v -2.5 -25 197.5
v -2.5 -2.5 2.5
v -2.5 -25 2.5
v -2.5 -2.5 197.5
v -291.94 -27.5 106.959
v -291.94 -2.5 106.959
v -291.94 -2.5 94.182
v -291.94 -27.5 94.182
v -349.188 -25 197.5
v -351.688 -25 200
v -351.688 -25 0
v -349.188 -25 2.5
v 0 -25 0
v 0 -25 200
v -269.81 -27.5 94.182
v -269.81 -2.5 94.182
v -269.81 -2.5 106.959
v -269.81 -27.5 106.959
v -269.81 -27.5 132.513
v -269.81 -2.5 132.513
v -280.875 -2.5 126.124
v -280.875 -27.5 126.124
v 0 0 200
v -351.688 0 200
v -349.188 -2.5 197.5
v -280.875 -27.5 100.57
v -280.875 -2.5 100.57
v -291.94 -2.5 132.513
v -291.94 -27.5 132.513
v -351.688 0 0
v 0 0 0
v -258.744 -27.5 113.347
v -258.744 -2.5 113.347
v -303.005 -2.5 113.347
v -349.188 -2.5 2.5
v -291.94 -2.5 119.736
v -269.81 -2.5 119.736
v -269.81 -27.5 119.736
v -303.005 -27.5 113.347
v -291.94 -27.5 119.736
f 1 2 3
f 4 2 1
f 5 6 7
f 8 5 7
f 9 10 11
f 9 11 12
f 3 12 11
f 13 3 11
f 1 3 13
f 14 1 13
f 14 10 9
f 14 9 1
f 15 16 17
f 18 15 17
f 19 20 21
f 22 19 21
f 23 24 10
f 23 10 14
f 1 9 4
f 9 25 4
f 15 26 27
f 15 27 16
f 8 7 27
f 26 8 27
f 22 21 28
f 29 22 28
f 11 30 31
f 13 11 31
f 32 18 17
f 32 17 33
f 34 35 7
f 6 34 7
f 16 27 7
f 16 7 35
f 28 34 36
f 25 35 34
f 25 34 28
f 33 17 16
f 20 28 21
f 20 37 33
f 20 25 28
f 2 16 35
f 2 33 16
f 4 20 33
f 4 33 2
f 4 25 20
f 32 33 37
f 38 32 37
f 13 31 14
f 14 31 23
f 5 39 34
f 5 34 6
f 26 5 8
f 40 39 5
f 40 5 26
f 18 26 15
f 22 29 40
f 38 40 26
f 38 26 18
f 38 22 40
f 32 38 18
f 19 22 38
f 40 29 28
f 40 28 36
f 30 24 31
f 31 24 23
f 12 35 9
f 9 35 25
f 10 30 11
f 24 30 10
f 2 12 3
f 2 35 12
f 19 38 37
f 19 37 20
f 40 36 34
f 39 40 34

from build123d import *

# Parameters (mm, degrees)
F0_W     = 351.6883096945
F0_H     = 200
F1_DEPTH = 25
F2_T     = -2.5
F4_DEPTH = 25


with BuildPart() as f1:
    # F0 (on Front) → F1 (new body)
    with BuildSketch(Plane.XZ):
        with Locations((-175.8441548473, 100)):
            Rectangle(F0_W, F0_H)
    extrude(amount=F1_DEPTH)

    # F2
    f2_openings = [f1.faces().sort_by_distance(p)[0] for p in [
        (-175.844155, -25, 100),
    ]]
    offset(amount=F2_T, openings=f2_openings)

    # F3 (on face) → F4 (join)
    with BuildSketch(Plane.XZ.offset(2.5)):
        Polygon((-291.9401824474, 119.7359256967), (-280.8749377728, 126.1244476883), (-291.9401824474, 132.5129696799), align=None)
        Polygon((-269.8096930981, 106.9588817135), (-269.8096930981, 119.7359256967), (-280.8749377728, 126.1244476883), (-291.9401824474, 119.7359256967), (-291.9401824474, 106.9588817135), (-280.8749377728, 100.570359722), align=None)
        Polygon((-269.8096930981, 119.7359256967), (-269.8096930981, 132.5129696799), (-280.8749377728, 126.1244476883), align=None)
        Polygon((-269.8096930981, 94.1818377304), (-269.8096930981, 106.9588817135), (-280.8749377728, 100.570359722), align=None)
        Polygon((-291.9401824474, 94.1818377304), (-280.8749377728, 100.570359722), (-291.9401824474, 106.9588817135), align=None)
        Polygon((-291.9401824474, 106.9588817135), (-291.9401824474, 119.7359256967), (-303.0054271221, 113.3474037051), align=None)
        Polygon((-258.7444484234, 113.3474037051), (-269.8096930981, 119.7359256967), (-269.8096930981, 106.9588817135), align=None)
    extrude(amount=F4_DEPTH)


solid = f1.part
